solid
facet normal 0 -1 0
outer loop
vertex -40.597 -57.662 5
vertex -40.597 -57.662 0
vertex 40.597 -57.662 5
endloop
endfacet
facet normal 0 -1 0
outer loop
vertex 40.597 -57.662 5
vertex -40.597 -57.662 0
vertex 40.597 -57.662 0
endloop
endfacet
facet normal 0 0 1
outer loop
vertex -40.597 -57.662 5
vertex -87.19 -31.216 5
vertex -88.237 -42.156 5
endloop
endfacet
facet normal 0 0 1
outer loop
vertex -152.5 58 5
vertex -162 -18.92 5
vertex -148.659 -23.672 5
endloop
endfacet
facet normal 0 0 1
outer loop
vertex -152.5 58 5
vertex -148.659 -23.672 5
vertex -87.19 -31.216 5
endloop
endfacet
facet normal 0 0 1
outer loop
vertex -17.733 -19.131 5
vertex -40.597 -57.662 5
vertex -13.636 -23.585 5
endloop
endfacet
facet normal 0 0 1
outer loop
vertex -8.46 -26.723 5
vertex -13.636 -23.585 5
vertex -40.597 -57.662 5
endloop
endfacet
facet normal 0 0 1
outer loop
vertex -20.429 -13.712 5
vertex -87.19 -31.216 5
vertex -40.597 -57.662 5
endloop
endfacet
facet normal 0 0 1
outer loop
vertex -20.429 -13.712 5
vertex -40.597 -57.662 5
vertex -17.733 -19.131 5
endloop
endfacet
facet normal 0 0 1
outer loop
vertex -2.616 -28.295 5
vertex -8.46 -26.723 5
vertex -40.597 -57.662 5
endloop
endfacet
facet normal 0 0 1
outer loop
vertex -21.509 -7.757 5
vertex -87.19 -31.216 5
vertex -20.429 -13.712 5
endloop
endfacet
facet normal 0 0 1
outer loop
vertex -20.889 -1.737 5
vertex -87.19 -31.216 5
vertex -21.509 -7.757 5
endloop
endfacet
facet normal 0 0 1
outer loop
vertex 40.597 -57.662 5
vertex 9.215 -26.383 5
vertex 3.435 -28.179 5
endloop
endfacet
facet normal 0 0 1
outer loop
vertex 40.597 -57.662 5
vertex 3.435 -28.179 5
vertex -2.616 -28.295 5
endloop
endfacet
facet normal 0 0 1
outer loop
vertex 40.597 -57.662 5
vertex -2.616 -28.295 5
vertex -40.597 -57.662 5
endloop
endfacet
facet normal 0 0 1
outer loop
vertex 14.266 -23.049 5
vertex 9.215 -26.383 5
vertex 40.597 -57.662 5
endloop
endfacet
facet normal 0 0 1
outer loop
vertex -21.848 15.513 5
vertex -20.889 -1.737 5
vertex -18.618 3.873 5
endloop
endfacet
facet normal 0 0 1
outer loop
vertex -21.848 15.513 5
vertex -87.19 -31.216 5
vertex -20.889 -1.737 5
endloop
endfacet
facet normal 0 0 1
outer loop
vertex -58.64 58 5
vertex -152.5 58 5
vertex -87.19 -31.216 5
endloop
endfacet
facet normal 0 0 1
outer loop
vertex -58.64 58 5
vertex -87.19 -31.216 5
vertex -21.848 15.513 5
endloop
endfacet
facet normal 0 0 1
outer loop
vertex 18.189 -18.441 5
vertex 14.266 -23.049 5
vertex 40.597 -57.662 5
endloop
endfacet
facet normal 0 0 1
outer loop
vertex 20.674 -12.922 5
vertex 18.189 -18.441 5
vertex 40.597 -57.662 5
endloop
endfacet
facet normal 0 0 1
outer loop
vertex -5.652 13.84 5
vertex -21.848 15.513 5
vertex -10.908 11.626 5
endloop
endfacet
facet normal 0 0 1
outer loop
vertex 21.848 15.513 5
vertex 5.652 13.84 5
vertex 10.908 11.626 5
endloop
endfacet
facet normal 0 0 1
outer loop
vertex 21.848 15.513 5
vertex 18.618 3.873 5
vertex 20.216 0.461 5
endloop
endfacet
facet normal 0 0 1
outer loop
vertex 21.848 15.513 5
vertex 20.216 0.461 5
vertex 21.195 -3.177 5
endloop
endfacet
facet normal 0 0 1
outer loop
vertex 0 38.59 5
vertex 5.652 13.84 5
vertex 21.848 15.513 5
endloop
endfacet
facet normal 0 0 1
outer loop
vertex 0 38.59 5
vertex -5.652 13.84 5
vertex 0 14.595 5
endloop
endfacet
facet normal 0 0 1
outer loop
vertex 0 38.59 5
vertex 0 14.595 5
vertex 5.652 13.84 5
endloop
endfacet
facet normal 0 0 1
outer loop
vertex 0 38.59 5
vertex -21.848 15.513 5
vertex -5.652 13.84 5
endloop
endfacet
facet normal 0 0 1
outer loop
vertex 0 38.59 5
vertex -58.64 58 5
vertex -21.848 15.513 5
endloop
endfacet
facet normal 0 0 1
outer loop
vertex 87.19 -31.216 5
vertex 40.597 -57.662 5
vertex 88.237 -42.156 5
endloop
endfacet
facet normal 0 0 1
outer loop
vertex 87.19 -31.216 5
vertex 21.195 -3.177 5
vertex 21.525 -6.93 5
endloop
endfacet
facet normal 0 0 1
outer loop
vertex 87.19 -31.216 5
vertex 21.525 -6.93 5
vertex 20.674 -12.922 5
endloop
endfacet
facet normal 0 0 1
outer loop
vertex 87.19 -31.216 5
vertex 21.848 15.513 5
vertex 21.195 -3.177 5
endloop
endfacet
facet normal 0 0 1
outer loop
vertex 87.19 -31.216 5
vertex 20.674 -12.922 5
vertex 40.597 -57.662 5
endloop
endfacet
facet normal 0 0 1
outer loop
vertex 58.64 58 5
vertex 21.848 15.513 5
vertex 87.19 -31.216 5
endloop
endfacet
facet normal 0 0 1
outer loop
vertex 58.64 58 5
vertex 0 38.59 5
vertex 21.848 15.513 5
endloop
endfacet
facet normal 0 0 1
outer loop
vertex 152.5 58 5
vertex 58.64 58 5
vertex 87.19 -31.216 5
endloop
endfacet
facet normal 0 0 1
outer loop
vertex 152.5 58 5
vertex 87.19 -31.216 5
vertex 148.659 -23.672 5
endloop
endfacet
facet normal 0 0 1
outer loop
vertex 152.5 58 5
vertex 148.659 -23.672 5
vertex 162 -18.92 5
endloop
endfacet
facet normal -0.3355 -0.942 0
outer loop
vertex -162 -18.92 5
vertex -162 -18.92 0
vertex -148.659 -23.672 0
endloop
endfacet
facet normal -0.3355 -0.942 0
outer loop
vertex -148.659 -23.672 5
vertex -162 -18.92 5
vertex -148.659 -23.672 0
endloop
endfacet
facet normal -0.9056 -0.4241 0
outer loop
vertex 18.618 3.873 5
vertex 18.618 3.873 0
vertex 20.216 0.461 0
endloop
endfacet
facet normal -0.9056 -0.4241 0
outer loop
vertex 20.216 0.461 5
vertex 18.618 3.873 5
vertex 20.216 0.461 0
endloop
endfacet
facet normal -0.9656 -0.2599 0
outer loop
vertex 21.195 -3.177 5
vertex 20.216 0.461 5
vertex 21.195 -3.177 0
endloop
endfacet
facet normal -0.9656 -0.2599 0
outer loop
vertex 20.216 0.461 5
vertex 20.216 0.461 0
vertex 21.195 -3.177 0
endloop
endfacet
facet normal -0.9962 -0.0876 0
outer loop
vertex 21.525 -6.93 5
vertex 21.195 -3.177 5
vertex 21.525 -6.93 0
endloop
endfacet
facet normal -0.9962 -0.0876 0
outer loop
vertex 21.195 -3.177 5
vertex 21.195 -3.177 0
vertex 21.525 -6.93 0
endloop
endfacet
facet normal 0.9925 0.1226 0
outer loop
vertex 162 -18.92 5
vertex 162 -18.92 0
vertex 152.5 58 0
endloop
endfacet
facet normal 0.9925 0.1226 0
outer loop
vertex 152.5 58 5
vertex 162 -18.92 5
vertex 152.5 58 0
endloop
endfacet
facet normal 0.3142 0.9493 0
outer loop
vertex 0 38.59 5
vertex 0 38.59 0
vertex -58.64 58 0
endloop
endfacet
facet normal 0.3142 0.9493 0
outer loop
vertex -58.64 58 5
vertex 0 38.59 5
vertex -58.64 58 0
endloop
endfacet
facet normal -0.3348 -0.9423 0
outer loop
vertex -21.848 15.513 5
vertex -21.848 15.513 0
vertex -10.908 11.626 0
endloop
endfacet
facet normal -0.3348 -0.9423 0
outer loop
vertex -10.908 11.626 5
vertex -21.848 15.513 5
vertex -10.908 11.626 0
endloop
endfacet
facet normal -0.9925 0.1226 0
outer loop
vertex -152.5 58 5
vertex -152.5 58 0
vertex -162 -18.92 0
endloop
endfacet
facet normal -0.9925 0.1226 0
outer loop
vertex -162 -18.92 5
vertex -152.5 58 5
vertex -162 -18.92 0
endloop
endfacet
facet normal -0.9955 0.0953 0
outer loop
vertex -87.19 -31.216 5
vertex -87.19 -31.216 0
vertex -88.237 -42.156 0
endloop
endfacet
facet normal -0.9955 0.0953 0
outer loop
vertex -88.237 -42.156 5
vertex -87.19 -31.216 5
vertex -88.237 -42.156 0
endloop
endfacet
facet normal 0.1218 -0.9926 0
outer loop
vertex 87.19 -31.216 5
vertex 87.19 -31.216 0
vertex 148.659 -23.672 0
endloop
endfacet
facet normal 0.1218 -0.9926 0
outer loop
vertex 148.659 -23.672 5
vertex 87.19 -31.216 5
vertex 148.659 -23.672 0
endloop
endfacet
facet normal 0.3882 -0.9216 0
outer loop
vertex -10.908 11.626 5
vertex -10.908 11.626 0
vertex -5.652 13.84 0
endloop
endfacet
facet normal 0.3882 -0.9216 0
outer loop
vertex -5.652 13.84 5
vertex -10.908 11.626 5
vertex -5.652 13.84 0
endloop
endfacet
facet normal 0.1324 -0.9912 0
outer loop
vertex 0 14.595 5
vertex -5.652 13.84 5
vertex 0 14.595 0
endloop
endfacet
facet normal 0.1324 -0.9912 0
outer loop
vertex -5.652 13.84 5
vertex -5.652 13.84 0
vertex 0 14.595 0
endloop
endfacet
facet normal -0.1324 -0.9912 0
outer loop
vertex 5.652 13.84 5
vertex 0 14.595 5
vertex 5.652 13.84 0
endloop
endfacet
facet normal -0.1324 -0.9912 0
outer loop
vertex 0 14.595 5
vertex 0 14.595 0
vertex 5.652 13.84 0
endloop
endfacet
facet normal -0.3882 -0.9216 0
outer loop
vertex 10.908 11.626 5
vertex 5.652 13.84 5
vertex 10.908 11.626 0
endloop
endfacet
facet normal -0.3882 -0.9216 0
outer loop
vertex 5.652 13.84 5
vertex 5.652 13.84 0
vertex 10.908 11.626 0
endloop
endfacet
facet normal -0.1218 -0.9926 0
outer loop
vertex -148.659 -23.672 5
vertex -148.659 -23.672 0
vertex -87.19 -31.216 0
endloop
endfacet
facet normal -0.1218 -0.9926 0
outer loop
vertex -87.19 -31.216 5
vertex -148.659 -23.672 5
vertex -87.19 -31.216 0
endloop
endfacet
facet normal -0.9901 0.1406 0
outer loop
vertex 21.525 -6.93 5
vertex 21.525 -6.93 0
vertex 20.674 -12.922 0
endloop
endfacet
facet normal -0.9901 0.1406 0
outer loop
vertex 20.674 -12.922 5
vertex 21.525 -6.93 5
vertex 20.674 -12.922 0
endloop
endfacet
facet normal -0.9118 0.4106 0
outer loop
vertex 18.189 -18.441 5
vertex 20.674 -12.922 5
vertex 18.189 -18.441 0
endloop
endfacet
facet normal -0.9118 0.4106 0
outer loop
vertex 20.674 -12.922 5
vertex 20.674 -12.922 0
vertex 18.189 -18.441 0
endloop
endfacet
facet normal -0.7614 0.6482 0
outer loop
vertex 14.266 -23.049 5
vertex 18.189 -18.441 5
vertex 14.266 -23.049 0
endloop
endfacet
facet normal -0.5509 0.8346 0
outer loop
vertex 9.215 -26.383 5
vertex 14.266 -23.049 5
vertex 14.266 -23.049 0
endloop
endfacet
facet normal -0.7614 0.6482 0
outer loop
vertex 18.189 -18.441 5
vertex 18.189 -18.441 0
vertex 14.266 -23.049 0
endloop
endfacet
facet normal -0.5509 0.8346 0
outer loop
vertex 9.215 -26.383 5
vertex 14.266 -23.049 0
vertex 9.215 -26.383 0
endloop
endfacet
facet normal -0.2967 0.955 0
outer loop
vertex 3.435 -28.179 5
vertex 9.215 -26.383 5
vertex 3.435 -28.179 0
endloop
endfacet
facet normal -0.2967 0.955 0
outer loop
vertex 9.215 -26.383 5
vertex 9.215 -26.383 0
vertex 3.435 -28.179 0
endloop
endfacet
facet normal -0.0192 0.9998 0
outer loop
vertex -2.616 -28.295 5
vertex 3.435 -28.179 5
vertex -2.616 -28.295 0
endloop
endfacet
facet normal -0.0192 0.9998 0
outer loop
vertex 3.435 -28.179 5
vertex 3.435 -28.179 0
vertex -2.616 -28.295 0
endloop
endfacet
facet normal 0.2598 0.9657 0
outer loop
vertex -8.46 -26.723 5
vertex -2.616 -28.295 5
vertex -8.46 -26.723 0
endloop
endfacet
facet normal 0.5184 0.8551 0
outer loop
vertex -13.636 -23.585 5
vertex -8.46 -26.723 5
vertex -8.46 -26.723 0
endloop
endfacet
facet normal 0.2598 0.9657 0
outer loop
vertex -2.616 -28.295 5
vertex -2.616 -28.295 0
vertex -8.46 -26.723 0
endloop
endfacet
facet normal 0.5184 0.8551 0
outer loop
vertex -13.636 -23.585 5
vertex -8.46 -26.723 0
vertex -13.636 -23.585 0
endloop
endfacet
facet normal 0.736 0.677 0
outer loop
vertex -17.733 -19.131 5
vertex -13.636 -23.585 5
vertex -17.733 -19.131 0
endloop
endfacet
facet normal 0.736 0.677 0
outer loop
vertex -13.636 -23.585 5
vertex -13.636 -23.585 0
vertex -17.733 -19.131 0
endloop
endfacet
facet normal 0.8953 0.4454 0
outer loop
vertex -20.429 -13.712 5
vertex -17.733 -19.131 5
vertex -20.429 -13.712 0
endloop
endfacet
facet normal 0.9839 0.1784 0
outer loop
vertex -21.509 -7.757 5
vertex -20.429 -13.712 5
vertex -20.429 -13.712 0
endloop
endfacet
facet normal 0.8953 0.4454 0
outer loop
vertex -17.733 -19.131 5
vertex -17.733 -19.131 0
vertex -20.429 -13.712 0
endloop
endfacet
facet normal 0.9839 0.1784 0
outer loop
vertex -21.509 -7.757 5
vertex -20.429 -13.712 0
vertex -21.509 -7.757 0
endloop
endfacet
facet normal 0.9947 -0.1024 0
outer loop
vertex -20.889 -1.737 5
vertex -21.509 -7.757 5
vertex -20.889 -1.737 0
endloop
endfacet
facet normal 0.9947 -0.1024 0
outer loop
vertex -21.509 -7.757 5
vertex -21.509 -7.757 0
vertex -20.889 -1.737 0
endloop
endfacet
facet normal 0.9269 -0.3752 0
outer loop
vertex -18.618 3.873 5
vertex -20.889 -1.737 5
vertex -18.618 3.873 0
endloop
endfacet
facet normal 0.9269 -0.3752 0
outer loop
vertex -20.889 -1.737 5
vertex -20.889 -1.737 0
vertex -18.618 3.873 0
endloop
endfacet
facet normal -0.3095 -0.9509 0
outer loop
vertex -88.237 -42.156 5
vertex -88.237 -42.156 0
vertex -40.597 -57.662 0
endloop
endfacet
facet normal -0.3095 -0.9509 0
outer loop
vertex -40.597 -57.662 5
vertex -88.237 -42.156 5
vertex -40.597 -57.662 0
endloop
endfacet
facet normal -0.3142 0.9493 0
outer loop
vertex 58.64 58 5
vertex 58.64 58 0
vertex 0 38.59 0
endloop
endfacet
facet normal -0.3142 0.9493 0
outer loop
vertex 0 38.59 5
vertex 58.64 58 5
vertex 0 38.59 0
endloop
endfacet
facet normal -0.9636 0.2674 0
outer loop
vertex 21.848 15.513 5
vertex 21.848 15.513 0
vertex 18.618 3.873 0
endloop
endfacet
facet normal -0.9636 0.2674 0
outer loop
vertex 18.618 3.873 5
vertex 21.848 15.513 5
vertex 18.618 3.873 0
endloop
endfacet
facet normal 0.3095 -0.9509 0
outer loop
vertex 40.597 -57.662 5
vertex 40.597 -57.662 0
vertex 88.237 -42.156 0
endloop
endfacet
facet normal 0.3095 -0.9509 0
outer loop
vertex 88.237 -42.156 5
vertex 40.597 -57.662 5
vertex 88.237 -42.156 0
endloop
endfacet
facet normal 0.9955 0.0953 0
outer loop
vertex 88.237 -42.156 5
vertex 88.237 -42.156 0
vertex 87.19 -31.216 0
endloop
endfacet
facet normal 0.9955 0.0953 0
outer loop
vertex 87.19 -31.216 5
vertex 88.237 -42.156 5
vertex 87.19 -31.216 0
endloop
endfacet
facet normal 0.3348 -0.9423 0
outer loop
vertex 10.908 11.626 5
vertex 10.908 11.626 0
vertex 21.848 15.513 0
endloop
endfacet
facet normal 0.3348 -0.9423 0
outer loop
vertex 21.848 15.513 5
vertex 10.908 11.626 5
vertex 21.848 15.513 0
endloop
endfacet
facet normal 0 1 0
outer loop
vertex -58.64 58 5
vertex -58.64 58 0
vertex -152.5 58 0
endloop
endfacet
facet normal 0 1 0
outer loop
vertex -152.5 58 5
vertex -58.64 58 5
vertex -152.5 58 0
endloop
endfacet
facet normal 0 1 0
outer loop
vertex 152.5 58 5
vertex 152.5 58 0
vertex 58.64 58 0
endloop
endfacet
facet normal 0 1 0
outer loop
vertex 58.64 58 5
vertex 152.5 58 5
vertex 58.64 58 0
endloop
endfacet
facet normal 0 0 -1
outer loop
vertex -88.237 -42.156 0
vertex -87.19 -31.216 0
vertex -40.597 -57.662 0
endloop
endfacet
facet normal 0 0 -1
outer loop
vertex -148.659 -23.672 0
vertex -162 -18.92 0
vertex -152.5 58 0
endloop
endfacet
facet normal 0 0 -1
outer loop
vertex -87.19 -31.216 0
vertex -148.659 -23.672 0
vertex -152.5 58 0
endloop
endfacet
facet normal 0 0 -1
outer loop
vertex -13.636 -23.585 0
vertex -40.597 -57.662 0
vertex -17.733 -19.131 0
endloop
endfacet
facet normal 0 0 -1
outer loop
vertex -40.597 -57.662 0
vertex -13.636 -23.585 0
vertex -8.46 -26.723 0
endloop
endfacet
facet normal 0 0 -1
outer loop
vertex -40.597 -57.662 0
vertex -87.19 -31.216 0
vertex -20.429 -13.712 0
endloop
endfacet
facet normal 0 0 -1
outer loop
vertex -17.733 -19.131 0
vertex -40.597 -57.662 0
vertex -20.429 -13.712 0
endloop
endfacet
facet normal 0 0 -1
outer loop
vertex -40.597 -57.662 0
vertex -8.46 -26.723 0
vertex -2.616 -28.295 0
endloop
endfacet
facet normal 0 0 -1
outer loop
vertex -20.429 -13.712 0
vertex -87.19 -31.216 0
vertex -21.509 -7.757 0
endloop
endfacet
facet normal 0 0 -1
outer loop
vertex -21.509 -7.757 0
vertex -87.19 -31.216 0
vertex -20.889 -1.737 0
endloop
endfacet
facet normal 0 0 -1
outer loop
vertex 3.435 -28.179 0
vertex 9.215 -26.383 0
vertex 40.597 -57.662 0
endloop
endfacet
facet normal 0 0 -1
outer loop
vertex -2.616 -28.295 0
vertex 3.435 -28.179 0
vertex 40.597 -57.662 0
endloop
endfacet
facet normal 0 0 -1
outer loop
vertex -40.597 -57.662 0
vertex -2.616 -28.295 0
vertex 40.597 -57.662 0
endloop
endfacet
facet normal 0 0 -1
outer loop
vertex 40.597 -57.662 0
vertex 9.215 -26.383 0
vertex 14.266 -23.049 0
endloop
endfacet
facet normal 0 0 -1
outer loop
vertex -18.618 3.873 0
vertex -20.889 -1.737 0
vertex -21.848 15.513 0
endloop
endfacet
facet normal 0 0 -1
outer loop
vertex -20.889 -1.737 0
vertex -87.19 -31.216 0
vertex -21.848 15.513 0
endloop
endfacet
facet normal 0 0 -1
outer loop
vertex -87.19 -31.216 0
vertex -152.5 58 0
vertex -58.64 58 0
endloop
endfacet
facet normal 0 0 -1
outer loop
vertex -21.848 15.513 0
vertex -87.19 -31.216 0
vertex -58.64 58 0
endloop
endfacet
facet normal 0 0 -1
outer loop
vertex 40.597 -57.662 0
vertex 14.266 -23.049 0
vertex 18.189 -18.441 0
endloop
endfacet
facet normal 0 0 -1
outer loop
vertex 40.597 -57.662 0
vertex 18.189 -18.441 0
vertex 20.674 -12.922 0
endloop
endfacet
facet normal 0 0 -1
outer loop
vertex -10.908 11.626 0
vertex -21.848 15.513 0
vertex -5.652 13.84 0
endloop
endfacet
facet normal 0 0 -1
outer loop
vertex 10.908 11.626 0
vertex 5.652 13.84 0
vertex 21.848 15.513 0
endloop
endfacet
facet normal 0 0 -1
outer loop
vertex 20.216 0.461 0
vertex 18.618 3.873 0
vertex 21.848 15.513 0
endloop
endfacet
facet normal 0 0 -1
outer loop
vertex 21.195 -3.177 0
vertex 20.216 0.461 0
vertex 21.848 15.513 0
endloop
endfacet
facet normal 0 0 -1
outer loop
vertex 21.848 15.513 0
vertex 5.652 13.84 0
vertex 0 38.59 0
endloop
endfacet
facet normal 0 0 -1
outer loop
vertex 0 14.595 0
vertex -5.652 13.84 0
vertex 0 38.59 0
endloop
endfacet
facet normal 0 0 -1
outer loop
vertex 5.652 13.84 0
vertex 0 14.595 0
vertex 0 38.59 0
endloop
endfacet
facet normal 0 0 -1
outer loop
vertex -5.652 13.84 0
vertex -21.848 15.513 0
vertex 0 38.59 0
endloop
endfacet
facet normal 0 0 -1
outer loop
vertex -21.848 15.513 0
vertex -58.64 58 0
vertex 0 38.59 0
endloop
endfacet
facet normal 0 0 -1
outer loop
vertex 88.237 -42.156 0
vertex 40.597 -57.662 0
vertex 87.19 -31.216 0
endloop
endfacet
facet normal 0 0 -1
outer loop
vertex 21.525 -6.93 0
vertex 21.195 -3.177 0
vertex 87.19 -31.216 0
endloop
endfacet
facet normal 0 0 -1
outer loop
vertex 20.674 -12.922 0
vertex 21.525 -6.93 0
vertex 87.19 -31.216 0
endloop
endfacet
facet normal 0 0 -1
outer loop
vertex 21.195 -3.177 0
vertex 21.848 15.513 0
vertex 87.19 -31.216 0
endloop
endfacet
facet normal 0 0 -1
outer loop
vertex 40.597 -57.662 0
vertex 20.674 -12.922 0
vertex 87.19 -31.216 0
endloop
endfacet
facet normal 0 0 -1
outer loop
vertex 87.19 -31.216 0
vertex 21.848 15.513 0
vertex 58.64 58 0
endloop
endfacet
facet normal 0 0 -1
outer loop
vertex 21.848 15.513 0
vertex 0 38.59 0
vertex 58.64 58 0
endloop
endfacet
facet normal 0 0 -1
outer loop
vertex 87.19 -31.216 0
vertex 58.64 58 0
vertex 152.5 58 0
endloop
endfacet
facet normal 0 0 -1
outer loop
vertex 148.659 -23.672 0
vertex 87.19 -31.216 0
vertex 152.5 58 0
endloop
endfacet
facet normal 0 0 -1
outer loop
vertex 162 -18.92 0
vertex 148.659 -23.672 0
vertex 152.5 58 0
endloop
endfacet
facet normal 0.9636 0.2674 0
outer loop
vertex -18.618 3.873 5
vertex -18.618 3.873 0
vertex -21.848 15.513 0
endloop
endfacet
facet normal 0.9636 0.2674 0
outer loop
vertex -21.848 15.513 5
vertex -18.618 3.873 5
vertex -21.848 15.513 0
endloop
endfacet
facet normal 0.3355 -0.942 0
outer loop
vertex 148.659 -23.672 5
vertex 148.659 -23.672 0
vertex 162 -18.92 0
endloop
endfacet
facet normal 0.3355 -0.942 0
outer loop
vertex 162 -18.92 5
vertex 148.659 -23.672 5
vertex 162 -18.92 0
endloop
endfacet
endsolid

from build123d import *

# Parameters (mm, degrees)
EXTRUDE_2_DEPTH = 5


with BuildPart() as part:
    # Эскиз4 → Бобышка-Вытянуть2 (new body)
    with BuildSketch(Plane.XY):
        Polygon((162, -18.92), (152.5, 58), (58.64, 58), (0, 38.59), (-58.64, 58), (-152.5, 58), (-162, -18.92), (-148.658722082, -23.671565122), (-87.19, -31.21617284), (-88.237138959, -42.15617284), (-40.597138959, -57.662313559), (40.597138959, -57.662313559), (88.237138959, -42.15617284), (87.19, -31.21617284), (148.658722082, -23.671565122), align=None)
        with BuildLine():
            Line((10.908195141, 11.626317085), (21.848195141, 15.513282482))
            Line((21.848195141, 15.513282482), (18.617591482, 3.873282482))
            ThreePointArc((18.617591482, 3.873282482), (20.785443003, -1.336165522), (21.525, -6.93))
            ThreePointArc((21.525, -6.93), (-5.593834478, -27.715443003), (-18.617591482, 3.873282482))
            Line((-18.617591482, 3.873282482), (-21.848195141, 15.513282482))
            Line((-21.848195141, 15.513282482), (-10.908195141, 11.626317085))
            ThreePointArc((-10.908195141, 11.626317085), (0, 14.595), (10.908195141, 11.626317085))
        make_face(mode=Mode.SUBTRACT)
    extrude(amount=EXTRUDE_2_DEPTH)


solid = part.part
